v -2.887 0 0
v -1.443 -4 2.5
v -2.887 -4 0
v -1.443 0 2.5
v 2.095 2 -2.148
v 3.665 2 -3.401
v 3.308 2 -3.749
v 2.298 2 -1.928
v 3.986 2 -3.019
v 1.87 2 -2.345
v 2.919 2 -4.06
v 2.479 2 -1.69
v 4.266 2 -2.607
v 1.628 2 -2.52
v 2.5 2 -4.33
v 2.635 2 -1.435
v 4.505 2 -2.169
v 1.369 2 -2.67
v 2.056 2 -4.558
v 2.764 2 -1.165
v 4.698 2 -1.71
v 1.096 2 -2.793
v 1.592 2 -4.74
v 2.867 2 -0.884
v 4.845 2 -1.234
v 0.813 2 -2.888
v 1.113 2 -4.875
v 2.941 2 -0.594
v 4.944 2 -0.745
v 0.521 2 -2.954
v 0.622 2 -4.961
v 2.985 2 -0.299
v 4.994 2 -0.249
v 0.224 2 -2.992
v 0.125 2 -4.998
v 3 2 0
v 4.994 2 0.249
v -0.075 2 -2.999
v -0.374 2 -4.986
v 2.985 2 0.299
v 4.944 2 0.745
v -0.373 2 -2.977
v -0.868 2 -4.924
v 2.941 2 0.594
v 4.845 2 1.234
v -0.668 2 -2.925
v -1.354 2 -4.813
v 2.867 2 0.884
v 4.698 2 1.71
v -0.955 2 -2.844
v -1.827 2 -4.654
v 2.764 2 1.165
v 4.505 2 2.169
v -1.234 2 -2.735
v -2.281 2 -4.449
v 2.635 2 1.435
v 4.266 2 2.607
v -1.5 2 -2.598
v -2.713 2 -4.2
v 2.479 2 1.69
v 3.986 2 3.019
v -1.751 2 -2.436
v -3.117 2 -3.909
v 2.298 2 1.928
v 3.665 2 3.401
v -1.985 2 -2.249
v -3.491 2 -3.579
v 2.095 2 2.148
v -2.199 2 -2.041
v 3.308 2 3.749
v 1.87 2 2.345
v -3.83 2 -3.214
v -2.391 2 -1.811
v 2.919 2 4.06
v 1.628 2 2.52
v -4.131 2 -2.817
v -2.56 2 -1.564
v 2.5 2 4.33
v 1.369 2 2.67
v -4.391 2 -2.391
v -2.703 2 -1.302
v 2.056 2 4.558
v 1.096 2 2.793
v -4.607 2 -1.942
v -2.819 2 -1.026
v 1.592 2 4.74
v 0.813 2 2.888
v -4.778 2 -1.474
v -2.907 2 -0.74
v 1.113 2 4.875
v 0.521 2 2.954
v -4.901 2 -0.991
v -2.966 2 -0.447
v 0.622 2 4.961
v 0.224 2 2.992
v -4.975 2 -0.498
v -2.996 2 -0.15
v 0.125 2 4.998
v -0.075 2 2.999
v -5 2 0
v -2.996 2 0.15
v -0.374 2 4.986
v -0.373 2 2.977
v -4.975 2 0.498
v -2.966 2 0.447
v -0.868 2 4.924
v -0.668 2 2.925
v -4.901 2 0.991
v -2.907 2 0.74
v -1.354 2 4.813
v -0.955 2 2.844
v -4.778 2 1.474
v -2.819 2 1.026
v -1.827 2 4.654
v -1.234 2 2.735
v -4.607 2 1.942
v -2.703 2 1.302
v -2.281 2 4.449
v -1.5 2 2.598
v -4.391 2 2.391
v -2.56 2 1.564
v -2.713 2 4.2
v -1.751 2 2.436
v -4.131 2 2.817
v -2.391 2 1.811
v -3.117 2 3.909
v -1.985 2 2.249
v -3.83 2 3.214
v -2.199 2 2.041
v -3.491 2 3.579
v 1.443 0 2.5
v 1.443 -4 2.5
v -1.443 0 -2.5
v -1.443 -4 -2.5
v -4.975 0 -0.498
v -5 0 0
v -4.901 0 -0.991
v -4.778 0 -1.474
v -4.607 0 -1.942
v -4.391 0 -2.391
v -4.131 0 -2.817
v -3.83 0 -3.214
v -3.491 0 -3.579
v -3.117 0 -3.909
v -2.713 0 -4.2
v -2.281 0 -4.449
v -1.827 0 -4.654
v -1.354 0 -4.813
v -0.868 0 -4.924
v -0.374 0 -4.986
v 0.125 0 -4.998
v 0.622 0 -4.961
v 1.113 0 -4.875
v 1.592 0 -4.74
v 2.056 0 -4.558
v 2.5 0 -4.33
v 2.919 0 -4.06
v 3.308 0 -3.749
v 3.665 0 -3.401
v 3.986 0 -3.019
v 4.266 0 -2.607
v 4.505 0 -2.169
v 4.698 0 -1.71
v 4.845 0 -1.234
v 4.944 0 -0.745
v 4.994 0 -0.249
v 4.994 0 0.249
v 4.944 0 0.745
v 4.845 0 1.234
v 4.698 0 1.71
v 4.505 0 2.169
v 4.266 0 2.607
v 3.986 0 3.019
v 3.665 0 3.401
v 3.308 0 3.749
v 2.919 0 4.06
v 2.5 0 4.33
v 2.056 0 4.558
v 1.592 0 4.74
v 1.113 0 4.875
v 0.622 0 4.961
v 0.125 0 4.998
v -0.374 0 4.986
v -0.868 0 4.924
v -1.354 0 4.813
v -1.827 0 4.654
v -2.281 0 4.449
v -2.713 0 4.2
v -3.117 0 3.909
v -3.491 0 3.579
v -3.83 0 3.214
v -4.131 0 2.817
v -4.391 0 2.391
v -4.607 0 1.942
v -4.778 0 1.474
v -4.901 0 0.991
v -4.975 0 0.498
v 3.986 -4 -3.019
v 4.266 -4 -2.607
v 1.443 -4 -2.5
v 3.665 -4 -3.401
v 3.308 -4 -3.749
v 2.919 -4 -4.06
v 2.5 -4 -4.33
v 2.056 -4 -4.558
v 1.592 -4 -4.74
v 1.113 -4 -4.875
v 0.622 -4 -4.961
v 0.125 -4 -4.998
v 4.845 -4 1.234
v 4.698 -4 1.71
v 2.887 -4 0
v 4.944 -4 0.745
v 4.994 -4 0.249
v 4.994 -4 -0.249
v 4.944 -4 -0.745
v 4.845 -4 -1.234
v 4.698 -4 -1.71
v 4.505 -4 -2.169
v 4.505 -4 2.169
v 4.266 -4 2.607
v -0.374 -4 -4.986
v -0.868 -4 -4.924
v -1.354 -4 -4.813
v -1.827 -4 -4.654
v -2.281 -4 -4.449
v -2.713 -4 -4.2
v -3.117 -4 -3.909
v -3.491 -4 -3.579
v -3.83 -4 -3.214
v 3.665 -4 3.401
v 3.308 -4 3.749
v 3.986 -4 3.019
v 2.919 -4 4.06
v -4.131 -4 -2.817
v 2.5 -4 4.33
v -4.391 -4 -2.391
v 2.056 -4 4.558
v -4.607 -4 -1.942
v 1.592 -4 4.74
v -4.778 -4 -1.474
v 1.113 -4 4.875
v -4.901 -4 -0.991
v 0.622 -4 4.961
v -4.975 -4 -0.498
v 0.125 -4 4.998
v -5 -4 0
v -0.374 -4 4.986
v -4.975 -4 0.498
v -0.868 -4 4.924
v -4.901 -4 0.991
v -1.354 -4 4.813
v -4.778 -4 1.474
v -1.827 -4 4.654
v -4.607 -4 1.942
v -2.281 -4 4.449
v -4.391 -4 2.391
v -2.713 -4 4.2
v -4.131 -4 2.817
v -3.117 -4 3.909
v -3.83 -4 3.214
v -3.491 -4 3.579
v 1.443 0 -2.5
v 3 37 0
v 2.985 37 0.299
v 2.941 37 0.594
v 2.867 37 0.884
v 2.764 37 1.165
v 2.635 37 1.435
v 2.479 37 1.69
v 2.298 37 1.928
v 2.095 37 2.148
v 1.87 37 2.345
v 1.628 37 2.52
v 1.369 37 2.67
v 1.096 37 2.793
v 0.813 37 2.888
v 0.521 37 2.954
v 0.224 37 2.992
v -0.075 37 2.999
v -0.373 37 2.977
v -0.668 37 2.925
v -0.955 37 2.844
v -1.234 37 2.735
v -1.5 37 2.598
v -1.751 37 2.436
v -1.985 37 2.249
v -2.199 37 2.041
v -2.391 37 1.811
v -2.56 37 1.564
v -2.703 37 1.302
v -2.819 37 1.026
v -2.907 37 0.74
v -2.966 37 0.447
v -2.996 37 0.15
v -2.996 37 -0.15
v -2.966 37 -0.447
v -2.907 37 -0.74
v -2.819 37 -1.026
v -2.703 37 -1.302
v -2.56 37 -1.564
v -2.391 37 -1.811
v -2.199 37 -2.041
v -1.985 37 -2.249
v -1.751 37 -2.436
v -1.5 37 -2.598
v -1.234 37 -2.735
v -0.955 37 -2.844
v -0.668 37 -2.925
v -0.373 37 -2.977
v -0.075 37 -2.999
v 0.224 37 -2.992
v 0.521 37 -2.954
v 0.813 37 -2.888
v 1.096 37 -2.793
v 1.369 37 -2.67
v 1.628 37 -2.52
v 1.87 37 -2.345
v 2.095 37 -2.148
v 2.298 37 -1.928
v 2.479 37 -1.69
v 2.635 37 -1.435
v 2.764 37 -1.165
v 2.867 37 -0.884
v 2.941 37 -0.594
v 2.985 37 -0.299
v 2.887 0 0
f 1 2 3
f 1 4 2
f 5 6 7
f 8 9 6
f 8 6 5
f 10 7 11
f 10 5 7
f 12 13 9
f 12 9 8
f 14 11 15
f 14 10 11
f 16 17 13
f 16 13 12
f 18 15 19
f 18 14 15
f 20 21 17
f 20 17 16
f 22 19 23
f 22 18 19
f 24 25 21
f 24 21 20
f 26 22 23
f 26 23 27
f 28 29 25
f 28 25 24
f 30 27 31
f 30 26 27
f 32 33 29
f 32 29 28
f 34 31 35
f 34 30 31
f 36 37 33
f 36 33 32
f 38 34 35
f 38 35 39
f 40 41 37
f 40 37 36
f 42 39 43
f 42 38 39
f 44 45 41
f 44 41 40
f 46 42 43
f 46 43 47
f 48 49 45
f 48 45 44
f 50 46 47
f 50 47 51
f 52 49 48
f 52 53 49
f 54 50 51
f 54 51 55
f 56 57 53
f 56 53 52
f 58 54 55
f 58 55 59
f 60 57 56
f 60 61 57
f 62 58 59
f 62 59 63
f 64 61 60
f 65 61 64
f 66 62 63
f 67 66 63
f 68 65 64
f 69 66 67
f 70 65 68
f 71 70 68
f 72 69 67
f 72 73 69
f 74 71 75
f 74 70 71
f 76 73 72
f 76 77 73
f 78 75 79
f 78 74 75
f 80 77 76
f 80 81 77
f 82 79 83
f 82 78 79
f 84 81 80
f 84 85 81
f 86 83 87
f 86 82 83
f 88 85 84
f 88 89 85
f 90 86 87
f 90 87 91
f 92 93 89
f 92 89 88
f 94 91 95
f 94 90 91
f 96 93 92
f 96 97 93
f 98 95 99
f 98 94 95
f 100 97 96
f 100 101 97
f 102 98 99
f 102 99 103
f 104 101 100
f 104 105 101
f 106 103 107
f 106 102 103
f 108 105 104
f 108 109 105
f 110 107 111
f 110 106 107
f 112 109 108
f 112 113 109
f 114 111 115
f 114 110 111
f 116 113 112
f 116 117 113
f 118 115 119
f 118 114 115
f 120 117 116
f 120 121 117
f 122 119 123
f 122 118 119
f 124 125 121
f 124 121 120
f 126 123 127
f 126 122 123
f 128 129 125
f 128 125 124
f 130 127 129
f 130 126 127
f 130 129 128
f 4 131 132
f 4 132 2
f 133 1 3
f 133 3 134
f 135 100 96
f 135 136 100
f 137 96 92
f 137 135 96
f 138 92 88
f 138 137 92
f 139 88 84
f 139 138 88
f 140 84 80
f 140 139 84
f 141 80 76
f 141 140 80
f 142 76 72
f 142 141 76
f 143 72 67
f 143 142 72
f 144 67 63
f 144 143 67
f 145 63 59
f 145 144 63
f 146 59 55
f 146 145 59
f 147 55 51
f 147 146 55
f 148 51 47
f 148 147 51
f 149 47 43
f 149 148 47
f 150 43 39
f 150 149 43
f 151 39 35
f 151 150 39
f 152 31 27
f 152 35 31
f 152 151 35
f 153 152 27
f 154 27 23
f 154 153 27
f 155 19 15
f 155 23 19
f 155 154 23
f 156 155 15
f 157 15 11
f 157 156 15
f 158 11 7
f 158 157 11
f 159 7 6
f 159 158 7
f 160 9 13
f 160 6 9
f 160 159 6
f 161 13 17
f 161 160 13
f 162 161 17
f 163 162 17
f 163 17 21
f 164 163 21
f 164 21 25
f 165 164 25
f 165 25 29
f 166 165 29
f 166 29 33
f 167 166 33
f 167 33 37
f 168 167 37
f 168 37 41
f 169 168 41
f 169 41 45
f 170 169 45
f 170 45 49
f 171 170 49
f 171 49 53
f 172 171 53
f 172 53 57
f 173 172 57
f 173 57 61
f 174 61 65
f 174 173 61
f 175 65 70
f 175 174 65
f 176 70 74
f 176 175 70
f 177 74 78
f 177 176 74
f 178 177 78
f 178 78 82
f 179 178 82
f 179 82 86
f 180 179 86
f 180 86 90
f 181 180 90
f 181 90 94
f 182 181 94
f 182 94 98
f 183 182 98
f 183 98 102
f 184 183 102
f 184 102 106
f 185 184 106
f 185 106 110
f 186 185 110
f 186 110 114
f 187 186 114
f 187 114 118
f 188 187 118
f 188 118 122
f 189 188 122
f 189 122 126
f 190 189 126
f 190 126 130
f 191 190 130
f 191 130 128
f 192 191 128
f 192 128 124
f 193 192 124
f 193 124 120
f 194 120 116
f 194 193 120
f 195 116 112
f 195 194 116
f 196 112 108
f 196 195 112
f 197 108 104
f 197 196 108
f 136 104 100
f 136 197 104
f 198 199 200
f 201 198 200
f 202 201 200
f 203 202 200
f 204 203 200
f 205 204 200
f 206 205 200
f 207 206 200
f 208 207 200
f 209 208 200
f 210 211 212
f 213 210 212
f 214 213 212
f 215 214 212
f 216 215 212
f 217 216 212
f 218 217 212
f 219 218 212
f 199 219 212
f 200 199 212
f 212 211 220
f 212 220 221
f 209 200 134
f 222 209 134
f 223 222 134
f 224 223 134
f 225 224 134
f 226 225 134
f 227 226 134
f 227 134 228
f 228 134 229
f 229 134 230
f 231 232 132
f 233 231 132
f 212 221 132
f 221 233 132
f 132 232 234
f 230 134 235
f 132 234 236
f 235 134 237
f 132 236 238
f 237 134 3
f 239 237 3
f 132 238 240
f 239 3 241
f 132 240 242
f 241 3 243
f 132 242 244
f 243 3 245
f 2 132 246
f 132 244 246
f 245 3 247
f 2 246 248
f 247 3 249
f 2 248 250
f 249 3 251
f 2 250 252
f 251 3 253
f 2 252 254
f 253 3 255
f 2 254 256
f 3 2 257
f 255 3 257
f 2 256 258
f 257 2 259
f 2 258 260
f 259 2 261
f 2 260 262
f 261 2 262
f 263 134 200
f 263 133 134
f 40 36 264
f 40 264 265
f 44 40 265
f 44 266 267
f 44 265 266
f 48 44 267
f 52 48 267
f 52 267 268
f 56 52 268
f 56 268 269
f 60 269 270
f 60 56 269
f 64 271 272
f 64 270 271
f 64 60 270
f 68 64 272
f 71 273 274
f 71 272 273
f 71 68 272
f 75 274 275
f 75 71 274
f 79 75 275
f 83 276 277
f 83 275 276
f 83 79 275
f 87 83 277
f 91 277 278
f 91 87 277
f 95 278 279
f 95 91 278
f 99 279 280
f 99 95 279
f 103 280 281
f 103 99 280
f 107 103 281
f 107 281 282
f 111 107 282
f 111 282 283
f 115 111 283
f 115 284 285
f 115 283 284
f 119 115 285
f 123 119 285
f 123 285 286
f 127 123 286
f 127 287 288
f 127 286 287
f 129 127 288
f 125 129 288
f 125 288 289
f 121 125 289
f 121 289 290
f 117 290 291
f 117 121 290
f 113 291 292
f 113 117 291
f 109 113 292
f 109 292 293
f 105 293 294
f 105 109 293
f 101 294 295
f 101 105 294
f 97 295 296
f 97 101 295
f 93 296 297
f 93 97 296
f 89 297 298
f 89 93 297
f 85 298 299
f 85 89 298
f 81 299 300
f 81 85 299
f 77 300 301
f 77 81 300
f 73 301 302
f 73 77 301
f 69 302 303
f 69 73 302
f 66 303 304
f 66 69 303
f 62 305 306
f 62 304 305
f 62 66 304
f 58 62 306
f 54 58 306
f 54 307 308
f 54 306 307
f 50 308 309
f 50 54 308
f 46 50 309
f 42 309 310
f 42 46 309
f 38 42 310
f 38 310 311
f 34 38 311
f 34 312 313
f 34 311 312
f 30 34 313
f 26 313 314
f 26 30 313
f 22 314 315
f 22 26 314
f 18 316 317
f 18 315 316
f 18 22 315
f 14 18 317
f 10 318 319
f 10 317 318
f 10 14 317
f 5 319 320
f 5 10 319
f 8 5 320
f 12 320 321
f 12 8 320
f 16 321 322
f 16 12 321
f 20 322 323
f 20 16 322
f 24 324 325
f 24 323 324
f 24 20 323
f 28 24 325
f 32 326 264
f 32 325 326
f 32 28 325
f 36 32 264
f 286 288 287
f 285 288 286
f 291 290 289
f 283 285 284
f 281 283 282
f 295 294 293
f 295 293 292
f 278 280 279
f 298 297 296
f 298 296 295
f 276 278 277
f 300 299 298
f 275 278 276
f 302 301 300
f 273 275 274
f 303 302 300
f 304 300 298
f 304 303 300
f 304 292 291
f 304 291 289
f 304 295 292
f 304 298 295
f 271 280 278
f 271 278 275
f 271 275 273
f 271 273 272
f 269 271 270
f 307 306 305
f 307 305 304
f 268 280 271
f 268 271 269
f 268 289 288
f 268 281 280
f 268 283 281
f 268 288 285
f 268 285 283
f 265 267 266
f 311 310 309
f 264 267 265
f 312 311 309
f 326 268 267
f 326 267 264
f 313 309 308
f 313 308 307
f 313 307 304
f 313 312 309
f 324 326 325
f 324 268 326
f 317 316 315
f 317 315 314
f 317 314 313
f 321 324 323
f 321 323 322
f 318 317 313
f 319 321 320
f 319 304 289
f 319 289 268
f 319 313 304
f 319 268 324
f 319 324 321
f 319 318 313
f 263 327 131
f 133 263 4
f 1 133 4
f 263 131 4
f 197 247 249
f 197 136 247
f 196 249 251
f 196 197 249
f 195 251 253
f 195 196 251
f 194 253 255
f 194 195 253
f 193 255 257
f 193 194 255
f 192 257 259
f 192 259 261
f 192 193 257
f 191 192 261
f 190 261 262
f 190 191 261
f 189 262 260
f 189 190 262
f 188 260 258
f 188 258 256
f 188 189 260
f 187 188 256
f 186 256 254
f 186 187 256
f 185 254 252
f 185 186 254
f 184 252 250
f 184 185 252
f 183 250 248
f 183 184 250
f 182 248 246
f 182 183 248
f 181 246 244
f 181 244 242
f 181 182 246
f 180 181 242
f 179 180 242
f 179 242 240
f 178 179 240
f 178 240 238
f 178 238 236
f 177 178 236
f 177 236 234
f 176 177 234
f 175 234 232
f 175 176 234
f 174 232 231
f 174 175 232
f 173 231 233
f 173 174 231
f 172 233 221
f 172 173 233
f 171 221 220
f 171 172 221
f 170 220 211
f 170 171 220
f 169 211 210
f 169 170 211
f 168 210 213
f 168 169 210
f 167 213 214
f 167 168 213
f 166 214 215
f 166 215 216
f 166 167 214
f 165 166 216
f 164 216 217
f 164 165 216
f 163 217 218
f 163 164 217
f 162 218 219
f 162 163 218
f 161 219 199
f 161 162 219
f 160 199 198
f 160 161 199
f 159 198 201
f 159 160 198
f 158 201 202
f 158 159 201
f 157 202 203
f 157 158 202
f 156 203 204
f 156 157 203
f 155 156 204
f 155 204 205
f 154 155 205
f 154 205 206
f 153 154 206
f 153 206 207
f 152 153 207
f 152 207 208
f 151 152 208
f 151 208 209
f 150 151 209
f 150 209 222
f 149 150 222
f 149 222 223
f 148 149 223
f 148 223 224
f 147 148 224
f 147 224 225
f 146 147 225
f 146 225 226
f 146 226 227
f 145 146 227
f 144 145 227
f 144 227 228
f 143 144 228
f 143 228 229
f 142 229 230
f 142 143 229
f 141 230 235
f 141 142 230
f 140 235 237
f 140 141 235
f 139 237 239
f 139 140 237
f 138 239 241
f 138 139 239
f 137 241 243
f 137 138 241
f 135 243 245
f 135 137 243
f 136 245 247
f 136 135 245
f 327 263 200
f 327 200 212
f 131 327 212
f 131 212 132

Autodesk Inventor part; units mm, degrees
ref_plane "YZ Plane" through (0, 0, 0) normal (1, 0, 0) x (0, 1, 0)
ref_plane "XZ Plane" through (0, 0, 0) normal (0, 1, 0) x (-1, 0, 0)
ref_plane "XY Plane" through (0, 0, 0) normal (0, 0, 1) x (1, 0, 0)
sketch "Szkic1" plane through (0, 0, 0) normal (0, 1, 0) x (-1, 0, 0)
  circle A0 centre (0, 0) radius 5
  line L0 (1.4434, 2.5) -> (2.8868, 0)
  line L1 (2.8868, 0) -> (1.4434, -2.5)
  line L2 (1.4434, -2.5) -> (-1.4434, -2.5)
  line L3 (-1.4434, -2.5) -> (-2.8868, 0)
  line L4 (-2.8868, 0) -> (-1.4434, 2.5)
  line L5 (-1.4434, 2.5) -> (1.4434, 2.5)
  circle A1 centre (0, 0) radius 3
  dimension "d0" = 10
  dimension "d1" = 5
  dimension "d2" = 6
extrude "Wyciągnięcie proste1" add sketch "Szkic1" along normal blind 2 contours A0 | L0 L1 L2 L3 L4 L5 | A1
extrude "Wyciągnięcie proste2" add sketch "Szkic1" against normal blind 4 contours A0 | A1
sketch "Szkic2" plane through (0, 2, 0) normal (0, 1, 0) x (1, 0, 0)
  circle A0 centre (0, 0) radius 3
  dimension "d7" = 6
extrude "Wyciągnięcie proste3" add sketch "Szkic2" along normal blind 35
thread "Gwint1" size "M6x1" class "6g" standard "ANSI Metric M Profile" length 65
properties part number "M6x35"
